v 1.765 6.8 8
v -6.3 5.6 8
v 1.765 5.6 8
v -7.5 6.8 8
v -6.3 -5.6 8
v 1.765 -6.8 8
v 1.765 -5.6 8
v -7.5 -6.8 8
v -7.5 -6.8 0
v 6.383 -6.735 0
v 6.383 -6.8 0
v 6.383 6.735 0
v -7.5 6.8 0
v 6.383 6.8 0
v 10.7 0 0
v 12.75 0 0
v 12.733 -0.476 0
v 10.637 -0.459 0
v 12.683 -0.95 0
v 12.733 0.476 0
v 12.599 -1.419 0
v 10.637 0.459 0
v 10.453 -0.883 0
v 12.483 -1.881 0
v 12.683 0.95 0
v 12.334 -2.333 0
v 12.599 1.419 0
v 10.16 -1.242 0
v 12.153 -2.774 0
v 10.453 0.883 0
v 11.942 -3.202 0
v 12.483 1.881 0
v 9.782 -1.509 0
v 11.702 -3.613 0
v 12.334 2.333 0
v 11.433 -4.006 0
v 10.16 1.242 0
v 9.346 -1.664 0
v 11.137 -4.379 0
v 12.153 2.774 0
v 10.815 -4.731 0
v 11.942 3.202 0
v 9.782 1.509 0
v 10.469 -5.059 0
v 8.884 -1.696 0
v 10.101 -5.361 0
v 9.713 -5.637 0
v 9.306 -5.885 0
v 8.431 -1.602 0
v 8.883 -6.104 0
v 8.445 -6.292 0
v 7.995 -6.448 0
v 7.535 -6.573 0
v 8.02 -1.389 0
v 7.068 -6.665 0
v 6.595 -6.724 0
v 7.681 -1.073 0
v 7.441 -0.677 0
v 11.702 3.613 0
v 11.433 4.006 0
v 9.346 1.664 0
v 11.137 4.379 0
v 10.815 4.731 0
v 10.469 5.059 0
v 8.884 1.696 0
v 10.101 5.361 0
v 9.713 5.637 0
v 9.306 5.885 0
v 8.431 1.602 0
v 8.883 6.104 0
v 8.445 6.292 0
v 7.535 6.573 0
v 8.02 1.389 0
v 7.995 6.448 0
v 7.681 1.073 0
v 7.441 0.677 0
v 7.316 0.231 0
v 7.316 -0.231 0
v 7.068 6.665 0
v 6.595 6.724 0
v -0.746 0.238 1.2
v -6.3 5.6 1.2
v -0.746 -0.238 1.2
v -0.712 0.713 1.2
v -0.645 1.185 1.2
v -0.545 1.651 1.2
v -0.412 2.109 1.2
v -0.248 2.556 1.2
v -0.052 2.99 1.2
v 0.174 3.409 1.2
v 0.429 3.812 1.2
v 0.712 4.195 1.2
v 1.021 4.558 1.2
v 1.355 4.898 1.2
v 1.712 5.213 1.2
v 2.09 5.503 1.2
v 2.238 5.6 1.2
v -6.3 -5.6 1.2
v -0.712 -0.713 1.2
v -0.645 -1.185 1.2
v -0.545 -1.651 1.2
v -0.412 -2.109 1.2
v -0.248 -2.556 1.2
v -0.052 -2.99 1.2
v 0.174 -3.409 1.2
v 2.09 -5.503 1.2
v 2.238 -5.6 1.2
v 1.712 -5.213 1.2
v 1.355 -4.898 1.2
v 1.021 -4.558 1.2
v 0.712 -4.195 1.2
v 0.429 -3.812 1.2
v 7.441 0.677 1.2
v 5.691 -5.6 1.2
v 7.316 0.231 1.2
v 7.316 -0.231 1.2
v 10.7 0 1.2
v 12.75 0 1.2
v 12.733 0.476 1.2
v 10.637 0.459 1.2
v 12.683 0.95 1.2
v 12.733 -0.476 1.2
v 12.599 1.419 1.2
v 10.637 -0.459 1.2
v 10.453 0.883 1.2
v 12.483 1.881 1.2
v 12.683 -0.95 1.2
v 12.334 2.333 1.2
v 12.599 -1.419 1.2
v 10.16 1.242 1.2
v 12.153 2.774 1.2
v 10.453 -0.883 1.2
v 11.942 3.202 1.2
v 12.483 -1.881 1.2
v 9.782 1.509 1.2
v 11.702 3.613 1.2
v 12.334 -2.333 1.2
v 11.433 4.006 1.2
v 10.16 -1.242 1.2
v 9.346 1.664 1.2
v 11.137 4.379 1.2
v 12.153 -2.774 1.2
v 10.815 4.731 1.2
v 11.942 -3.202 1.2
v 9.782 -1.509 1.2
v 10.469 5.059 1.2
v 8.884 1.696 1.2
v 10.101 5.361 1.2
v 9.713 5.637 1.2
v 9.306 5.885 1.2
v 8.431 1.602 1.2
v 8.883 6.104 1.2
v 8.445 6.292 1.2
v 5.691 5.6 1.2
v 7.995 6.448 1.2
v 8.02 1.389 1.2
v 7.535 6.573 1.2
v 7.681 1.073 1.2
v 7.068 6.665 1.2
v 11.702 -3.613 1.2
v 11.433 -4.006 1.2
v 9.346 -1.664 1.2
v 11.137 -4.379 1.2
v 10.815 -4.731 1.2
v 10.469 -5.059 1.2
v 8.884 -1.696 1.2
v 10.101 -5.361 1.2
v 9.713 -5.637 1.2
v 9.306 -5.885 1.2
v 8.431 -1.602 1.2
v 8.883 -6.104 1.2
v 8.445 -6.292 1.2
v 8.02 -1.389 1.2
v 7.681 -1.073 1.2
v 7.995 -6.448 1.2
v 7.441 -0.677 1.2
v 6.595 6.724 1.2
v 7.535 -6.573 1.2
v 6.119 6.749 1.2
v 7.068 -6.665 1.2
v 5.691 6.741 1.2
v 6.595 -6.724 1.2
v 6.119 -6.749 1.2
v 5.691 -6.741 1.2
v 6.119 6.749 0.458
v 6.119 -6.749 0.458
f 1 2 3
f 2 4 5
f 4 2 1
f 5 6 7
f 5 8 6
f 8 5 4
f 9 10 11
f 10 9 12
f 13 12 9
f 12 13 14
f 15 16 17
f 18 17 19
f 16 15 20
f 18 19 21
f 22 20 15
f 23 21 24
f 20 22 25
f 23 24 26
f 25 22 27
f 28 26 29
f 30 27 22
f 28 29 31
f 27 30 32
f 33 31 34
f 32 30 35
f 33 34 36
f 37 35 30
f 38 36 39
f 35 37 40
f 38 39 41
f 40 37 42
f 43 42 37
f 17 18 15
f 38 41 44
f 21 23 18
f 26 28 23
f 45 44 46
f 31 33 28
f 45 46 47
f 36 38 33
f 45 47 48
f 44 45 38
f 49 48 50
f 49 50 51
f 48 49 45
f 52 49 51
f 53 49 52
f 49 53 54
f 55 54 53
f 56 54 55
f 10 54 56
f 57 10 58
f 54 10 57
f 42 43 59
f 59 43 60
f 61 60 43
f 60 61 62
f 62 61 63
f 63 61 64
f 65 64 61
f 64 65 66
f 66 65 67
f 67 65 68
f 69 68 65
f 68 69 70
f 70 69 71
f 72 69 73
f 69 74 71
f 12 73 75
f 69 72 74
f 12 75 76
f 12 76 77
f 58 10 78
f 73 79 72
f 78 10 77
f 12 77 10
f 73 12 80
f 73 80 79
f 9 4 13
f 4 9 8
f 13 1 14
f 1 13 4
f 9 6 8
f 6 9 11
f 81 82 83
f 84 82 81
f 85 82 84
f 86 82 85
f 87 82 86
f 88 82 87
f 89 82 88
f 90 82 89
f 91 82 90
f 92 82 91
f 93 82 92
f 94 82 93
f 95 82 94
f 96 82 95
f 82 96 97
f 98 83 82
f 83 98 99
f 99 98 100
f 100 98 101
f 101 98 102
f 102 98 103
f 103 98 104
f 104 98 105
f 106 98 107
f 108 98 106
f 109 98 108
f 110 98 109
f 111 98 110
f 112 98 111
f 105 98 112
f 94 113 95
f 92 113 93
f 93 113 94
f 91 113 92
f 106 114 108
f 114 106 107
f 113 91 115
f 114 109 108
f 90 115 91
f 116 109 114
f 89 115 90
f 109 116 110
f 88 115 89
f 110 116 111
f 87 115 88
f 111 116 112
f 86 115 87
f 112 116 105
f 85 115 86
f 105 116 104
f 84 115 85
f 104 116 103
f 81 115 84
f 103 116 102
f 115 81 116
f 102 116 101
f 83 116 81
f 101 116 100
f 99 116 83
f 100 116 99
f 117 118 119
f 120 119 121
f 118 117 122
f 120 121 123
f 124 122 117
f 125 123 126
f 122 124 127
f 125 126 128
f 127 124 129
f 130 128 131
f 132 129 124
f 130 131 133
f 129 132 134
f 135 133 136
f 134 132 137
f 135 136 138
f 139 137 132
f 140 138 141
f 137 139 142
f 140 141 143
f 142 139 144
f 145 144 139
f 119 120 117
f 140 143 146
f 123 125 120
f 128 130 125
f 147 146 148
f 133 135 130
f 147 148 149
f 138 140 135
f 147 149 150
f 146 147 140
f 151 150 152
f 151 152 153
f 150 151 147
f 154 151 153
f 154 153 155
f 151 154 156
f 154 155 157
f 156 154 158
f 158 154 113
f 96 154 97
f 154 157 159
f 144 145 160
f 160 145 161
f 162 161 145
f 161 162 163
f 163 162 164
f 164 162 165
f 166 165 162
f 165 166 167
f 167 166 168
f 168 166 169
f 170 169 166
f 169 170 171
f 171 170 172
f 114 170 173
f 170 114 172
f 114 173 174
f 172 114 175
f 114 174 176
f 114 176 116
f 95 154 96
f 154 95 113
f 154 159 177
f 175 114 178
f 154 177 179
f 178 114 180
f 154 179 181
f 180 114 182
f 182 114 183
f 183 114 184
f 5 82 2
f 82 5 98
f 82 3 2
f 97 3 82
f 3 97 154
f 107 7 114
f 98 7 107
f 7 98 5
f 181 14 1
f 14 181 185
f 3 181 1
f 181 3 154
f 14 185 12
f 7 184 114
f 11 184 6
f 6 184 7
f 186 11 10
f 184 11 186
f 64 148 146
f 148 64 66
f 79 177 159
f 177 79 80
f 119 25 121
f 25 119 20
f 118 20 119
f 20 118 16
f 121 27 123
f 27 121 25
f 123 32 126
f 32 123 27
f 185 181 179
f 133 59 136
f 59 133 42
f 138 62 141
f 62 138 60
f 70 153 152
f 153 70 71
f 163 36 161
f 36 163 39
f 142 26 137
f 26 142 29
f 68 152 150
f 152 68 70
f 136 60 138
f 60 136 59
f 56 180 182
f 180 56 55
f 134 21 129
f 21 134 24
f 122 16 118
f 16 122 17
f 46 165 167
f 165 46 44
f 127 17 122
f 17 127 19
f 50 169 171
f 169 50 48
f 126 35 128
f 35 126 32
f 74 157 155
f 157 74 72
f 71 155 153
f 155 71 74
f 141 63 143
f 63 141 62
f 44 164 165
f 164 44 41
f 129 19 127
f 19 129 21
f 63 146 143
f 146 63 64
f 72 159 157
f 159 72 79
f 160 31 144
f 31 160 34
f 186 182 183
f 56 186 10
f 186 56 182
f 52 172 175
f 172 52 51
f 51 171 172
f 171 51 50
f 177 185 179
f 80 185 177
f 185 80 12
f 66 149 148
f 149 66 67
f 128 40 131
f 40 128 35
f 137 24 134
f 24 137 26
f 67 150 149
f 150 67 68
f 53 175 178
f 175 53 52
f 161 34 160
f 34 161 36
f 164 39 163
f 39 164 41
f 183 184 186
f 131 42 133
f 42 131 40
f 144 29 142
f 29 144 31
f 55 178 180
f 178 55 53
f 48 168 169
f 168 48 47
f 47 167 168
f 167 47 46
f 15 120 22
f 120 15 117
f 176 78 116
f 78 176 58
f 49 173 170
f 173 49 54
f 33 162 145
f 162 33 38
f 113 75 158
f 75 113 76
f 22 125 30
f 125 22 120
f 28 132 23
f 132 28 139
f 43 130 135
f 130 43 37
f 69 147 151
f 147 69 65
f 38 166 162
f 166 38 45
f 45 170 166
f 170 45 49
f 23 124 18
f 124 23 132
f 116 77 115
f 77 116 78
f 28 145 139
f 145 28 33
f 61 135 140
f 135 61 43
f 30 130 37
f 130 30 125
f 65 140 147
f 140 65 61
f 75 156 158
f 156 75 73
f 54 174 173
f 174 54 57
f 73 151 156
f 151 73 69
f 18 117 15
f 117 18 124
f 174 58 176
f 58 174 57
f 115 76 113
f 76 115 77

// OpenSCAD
// crystalHanger.scad
// 25 Feb 2021, Tom Flint
//-------------------------


module crystalHanger(){

difference(){
    translate([0,0,4])
    cube([12.6+2.4, 11.2+2.4, 8],center=true);
    
  translate([0,0,21.2])
  cube([12.6, 11.2, 40],center=true);

  translate([8,0,4+1.2])
  rotate([0,60,0])
  cube([12.6+2.4, 11.2+2.4+2, 8],center=true);
  
}
  difference(){

    translate([6,0,0])
    cylinder(r=6.75,h=1.2,$fn=89);

    translate([9,0,0])
  cylinder(r=1.7,h=10,center=true,$fn=23);
}
}

//==========================================

crystalHanger();

//==========================================
